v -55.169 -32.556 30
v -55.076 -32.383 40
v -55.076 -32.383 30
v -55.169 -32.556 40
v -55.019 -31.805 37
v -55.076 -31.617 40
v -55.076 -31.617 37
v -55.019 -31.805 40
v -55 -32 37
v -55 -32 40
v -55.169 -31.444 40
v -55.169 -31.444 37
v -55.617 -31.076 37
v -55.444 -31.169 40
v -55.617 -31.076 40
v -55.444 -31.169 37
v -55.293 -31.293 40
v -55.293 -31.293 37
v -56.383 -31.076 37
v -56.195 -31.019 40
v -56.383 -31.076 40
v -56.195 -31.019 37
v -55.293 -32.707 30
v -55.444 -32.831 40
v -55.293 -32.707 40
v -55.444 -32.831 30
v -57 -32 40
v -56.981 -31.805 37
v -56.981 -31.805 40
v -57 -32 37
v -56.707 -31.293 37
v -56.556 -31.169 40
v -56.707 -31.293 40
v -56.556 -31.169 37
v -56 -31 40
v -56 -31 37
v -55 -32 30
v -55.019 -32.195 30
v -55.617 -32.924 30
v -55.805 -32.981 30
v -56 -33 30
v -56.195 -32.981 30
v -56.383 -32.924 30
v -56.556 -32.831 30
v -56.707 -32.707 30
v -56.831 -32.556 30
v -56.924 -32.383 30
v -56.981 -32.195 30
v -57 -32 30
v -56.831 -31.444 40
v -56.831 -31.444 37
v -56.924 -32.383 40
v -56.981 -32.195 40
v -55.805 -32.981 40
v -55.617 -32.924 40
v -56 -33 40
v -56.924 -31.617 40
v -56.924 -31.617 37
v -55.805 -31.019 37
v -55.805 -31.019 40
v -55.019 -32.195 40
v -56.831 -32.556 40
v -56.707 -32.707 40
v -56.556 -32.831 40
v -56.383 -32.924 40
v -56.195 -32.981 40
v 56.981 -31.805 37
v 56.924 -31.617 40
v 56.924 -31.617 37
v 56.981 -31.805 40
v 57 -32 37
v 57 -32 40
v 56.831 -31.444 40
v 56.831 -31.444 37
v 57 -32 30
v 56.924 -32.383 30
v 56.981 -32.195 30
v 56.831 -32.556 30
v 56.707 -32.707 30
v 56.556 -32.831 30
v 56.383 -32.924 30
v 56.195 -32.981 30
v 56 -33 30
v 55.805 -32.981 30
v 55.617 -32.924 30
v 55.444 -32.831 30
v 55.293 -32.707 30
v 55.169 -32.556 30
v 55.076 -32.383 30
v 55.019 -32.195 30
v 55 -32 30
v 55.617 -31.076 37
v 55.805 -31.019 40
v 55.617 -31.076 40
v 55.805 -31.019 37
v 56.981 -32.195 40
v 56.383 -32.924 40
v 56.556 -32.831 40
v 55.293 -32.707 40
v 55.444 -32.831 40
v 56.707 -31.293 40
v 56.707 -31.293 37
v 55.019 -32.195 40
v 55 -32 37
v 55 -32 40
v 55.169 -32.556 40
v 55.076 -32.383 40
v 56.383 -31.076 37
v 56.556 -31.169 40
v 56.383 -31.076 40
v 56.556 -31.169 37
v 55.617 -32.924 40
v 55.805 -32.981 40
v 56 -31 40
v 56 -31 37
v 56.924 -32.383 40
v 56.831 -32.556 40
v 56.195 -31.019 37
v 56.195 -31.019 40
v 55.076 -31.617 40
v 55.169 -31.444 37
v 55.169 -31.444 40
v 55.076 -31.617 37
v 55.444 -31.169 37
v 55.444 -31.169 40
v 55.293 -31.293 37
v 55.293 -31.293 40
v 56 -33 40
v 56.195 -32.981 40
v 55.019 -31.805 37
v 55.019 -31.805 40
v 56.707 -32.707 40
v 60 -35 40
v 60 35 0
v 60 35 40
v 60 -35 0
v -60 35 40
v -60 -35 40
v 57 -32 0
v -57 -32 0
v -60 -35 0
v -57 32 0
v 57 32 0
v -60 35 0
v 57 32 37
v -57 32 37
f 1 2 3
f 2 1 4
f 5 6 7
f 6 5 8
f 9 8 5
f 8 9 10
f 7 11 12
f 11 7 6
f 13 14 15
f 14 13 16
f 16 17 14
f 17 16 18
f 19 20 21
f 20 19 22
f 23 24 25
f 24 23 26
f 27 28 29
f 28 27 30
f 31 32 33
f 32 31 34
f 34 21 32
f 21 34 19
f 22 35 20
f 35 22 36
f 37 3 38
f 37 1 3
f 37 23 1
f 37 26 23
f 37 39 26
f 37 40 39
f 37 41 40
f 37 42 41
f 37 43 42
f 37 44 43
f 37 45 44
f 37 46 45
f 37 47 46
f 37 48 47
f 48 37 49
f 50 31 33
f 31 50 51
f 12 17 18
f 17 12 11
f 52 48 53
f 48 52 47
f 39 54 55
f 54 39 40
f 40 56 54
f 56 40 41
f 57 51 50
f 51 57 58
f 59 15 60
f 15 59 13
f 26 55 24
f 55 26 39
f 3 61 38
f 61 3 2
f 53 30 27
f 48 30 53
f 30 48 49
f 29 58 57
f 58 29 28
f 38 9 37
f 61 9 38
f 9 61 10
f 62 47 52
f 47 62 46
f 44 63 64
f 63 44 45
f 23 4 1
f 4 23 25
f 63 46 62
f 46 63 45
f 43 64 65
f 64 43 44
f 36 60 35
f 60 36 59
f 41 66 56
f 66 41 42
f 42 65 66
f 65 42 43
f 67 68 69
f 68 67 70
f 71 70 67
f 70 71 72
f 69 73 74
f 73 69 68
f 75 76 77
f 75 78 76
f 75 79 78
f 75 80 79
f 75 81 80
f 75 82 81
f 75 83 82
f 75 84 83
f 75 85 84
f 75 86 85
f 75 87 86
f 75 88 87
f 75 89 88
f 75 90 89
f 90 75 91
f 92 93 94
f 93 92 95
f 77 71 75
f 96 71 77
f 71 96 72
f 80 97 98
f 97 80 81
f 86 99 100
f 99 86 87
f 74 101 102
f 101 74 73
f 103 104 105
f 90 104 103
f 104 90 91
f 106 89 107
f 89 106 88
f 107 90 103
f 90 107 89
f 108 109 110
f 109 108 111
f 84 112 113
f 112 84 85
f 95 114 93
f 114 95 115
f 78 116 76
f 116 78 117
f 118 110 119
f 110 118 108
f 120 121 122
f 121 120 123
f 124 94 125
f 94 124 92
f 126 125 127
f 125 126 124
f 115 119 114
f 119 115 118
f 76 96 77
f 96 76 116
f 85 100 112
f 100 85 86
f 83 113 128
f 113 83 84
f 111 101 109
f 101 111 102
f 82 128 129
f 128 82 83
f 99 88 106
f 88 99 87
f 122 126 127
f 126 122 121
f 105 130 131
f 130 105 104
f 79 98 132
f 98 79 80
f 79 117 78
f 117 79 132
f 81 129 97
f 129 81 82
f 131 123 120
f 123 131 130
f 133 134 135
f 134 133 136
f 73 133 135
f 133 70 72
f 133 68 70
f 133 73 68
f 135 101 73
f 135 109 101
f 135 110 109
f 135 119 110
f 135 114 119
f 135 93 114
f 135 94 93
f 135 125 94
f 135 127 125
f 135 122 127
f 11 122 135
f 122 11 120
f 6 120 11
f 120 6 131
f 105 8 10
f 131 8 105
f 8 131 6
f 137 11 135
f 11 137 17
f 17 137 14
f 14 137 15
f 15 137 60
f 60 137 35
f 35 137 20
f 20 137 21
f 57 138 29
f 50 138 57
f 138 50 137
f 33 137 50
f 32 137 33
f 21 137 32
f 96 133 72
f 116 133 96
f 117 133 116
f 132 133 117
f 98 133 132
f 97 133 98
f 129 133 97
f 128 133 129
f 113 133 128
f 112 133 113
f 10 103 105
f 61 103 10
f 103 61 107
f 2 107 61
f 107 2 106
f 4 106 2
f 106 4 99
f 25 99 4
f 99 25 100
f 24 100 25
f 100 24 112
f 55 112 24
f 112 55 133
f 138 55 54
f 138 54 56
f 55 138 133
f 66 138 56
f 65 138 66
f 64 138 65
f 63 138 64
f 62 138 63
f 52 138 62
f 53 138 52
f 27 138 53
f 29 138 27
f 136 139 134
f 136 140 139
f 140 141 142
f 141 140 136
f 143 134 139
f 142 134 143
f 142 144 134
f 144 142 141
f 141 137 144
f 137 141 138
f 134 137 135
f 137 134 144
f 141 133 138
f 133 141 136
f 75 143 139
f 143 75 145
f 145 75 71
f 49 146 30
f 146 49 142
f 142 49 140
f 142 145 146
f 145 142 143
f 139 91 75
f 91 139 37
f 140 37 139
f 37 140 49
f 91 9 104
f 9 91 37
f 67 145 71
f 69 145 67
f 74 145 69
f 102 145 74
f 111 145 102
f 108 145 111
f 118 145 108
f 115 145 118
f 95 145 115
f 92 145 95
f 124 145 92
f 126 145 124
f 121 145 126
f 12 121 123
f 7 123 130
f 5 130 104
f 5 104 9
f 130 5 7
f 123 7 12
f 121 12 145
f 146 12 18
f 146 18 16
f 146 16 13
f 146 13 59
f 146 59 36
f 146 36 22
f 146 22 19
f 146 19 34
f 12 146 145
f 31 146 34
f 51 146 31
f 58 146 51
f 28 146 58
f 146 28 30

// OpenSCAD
// Mini horizontal gel-electrophoresis buffer tank.
// Outer dimensions: 120mm (X) x 70mm (Y) x 40mm (Z).
// Wall thickness: 3mm. Floor thickness: 3mm.
// Internal platform: 60mm long (X), full width (Y), 10mm high above inner floor.
// Electrode holes: 2mm diameter, horizontal along Y, at ends (X=±), z=30.

$fn = 64;

// Outer dimensions
X_OUT = 120;
Y_OUT = 70;
Z_OUT = 40;

// Thicknesses
wall_thick = 3;
floor_thick = 3;

// Derived inner dimensions
X_IN  = X_OUT - 2 * wall_thick;
Y_IN  = Y_OUT - 2 * wall_thick;
Z_IN  = Z_OUT - floor_thick; // Open top, so Z height is just Z_OUT

// Platform dimensions
plat_len = 60;
plat_w   = Y_IN;
plat_h   = 10; // Height above inner floor

// Electrode hole specs
hole_d   = 2;
hole_z   = 30;

// Build the tank body (hollow box with floor)
// We build the outer shell and subtract the inner void.
// The inner void is split by the platform.

difference() {
    // 1. The solid outer block
    translate([-X_OUT/2, -Y_OUT/2, 0]) 
        cube([X_OUT, Y_OUT, Z_OUT]);

    // 2. The inner void (everything inside the walls)
    // We define the void as a union of two parts: the bottom chamber and the top chamber.
    // Bottom chamber: From z=0 to z=plat_h.
    // Top chamber: From z=plat_h to z=Z_IN.
    
    // Bottom void part (under the platform)
    translate([-X_IN/2, -Y_IN/2, 0]) 
        cube([X_IN, Y_IN, plat_h]);

    // Top void part (above the platform)
    translate([-X_IN/2, -Y_IN/2, plat_h]) 
        cube([X_IN, Y_IN, Z_IN - plat_h]);

    // 3. The platform itself (solid block inside the void)
    // Positioned at X = 0, Y = -Y_IN/2 to Y_IN/2, Z = plat_h to plat_h + plat_h
    translate([-plat_len/2, -plat_w/2, plat_h]) 
        cube([plat_len, plat_w, plat_h]);

    // 4. Electrode holes
    // Two holes, one at each end (X = +/- X_IN/2), centered in Y (y=0), at z=hole_z.
    // The hole is a cylinder along the Y axis (spanning the width of the tank).
    for (x_pos = [-1, 1]) {
        translate([x_pos * (X_IN/2 - hole_d/2), -Y_IN/2, hole_z]) 
            cylinder(h = Y_IN, d = hole_d, $fn = 32);
    }
}
